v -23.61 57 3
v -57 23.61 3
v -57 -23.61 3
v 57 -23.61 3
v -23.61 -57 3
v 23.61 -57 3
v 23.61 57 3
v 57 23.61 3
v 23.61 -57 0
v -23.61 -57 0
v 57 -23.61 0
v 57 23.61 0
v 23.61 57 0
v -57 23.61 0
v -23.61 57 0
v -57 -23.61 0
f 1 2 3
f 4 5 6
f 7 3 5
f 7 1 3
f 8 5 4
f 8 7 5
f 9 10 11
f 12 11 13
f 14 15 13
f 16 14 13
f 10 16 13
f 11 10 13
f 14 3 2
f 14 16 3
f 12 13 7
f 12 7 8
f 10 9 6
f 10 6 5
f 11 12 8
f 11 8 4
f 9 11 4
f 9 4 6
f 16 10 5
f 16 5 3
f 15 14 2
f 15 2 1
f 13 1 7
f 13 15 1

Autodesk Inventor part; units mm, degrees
ref_plane "YZ Plane" through (0, 0, 0) normal (1, 0, 0) x (0, 1, 0)
ref_plane "XZ Plane" through (0, 0, 0) normal (0, 1, 0) x (-1, 0, 0)
ref_plane "XY Plane" through (0, 0, 0) normal (0, 0, 1) x (1, 0, 0)
sketch "Sketch1" plane through (0, 0, 0) normal (0, 0, 1) x (1, 0, 0)
  circle A0 centre (0, 0) radius 57 construction
  circle A1 centre (0, 0) radius 105 construction
  line L0 (105, -105) -> (-105, -105)
  line L1 (-105, -105) -> (-105, 105)
  line L2 (-105, 105) -> (105, 105)
  line L3 (105, 105) -> (105, -105)
  line L4 (105, -105) -> (-105, 105) construction
  line L5 (-105, -105) -> (105, 105) construction
  line L6 (43.4924, 105) -> (105, 43.4924)
  line L7 (105, 43.4924) -> (105, -43.4924)
  line L8 (105, -43.4924) -> (43.4924, -105)
  line L9 (43.4924, -105) -> (-43.4924, -105)
  line L10 (-43.4924, -105) -> (-105, -43.4924)
  line L11 (-105, -43.4924) -> (-105, 43.4924)
  line L12 (-105, 43.4924) -> (-43.4924, 105)
  line L13 (-43.4924, 105) -> (43.4924, 105)
  line L14 (23.6102, 57) -> (57, 23.6102)
  line L15 (57, 23.6102) -> (57, -23.6102)
  line L16 (57, -23.6102) -> (23.6102, -57)
  line L17 (23.6102, -57) -> (-23.6102, -57)
  line L18 (-23.6102, -57) -> (-57, -23.6102)
  line L19 (-57, -23.6102) -> (-57, 23.6102)
  line L20 (-57, 23.6102) -> (-23.6102, 57)
  line L21 (-23.6102, 57) -> (23.6102, 57)
  point P0 (0, 105)
  point P1 (-105, 43.4924)
  point P2 (-43.4924, -105)
  point P3 (0, 57)
  dimension "d22" = 114
  dimension "d23" = 210
extrude "Plate1" add sketch "Sketch1" along normal blind 3 contours L14 L15 L16 L17 L18 L19 L20 L21
sketch "Sketch6" plane through (0, 0, 0) normal (0, 0, 1) x (1, 0, 0)
  line L0 (0, 0) -> (0, 85) construction
  circle A0 centre (0, 0) radius 85 construction
  line L1 (0, 0) -> (60.1041, 60.1041) construction
  circle A1 centre (60.1041, 60.1041) radius 9
  dimension "d32" = 18
  dimension "d33" = 170
  dimension "d34" = 45
cut "Cut2" [suppressed]
pattern_circular "Circular Pattern2" [suppressed]
equation "\"d23\" = Flange_D_outer"
equation "\"d32\" = Flange_d_hole_diam"
equation "\"d33\" = Flange_D1_hole_center"
equation "\"d35\" = Thickness"
equation "\"d2\" = Thickness"
equation "\"BendReliefWidth\" = Thickness"
equation "\"BendReliefDepth\" = 0.5 * Thickness"
equation "\"CornerReliefSize\" = 4 * Thickness"
equation "\"MinimumRemnant\" = 2 * Thickness"
equation "\"TransitionRadius\" = BendRadius"
equation "\"JacobiRadiusSize\" = BendRadius"
equation "\"GapSize\" = Thickness"
equation "\"Flange_D_outer\" = 210"
equation "\"Flange_d_hole_diam\" = 18"
equation "\"Flange_D1_hole_center\" = 170"
equation "\"Thickness\" = 3"
equation "\"BendRadius\" = 5"
properties part number "210 DS-B Axis cap" material "Stainless Steel"
